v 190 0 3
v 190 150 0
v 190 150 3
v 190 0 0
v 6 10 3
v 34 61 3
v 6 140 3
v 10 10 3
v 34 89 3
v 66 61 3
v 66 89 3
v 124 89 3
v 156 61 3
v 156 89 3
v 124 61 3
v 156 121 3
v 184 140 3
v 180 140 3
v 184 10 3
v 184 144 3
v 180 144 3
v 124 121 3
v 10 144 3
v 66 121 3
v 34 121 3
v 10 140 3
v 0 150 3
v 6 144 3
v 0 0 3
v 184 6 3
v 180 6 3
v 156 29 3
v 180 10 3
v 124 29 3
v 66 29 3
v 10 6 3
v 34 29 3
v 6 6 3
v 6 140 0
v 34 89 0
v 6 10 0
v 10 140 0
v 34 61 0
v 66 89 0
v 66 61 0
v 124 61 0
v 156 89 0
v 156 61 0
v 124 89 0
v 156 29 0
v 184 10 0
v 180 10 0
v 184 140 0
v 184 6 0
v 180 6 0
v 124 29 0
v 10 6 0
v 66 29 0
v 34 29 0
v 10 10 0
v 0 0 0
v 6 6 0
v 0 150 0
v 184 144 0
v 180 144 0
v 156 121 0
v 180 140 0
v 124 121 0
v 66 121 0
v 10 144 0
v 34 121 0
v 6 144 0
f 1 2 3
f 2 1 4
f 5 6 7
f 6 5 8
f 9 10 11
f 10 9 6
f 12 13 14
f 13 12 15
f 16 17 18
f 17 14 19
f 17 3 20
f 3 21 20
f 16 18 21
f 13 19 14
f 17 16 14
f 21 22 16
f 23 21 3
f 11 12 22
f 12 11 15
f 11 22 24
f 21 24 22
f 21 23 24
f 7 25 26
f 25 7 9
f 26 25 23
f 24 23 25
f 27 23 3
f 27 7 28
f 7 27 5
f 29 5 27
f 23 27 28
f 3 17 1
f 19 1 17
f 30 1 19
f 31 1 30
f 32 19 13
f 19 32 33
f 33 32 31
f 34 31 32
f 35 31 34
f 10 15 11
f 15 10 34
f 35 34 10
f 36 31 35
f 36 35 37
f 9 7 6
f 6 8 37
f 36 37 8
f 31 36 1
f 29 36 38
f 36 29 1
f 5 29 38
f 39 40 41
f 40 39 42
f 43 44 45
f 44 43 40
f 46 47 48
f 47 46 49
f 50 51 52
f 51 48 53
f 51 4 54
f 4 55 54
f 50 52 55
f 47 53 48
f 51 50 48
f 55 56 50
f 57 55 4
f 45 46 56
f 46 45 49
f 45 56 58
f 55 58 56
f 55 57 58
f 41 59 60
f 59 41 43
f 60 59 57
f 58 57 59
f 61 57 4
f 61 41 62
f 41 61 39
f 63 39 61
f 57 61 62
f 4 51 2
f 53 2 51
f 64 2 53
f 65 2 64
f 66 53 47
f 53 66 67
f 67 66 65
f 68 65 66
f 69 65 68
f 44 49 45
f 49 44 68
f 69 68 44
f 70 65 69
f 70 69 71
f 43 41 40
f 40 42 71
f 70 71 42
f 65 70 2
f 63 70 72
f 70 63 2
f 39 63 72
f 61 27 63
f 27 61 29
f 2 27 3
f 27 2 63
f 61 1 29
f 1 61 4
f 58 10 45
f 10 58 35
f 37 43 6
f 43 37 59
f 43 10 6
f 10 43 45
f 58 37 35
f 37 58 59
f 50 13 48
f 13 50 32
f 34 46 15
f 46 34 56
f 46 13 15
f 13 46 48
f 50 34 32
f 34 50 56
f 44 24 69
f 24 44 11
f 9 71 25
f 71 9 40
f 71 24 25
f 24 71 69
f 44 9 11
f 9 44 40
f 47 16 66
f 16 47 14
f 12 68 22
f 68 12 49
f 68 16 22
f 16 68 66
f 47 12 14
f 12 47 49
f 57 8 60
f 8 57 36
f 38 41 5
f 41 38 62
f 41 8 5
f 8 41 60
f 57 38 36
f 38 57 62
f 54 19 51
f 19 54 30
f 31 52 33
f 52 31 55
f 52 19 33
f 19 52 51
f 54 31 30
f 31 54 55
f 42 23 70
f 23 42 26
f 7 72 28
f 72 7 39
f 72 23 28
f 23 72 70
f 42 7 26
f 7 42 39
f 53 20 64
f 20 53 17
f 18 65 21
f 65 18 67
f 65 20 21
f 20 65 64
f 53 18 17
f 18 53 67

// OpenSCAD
// TEMPLATE ONLY. Measure and edit before printing. Millimetres.
difference(){union(){
translate([0, 0, 0]) cube([190, 150, 3]);
}
translate([34, 29, -1]) cube([32, 32, 5]);
translate([124, 29, -1]) cube([32, 32, 5]);
translate([34, 89, -1]) cube([32, 32, 5]);
translate([124, 89, -1]) cube([32, 32, 5]);
translate([6, 6, -1]) cube([4, 4, 5]);
translate([180, 6, -1]) cube([4, 4, 5]);
translate([6, 140, -1]) cube([4, 4, 5]);
translate([180, 140, -1]) cube([4, 4, 5]);
}
